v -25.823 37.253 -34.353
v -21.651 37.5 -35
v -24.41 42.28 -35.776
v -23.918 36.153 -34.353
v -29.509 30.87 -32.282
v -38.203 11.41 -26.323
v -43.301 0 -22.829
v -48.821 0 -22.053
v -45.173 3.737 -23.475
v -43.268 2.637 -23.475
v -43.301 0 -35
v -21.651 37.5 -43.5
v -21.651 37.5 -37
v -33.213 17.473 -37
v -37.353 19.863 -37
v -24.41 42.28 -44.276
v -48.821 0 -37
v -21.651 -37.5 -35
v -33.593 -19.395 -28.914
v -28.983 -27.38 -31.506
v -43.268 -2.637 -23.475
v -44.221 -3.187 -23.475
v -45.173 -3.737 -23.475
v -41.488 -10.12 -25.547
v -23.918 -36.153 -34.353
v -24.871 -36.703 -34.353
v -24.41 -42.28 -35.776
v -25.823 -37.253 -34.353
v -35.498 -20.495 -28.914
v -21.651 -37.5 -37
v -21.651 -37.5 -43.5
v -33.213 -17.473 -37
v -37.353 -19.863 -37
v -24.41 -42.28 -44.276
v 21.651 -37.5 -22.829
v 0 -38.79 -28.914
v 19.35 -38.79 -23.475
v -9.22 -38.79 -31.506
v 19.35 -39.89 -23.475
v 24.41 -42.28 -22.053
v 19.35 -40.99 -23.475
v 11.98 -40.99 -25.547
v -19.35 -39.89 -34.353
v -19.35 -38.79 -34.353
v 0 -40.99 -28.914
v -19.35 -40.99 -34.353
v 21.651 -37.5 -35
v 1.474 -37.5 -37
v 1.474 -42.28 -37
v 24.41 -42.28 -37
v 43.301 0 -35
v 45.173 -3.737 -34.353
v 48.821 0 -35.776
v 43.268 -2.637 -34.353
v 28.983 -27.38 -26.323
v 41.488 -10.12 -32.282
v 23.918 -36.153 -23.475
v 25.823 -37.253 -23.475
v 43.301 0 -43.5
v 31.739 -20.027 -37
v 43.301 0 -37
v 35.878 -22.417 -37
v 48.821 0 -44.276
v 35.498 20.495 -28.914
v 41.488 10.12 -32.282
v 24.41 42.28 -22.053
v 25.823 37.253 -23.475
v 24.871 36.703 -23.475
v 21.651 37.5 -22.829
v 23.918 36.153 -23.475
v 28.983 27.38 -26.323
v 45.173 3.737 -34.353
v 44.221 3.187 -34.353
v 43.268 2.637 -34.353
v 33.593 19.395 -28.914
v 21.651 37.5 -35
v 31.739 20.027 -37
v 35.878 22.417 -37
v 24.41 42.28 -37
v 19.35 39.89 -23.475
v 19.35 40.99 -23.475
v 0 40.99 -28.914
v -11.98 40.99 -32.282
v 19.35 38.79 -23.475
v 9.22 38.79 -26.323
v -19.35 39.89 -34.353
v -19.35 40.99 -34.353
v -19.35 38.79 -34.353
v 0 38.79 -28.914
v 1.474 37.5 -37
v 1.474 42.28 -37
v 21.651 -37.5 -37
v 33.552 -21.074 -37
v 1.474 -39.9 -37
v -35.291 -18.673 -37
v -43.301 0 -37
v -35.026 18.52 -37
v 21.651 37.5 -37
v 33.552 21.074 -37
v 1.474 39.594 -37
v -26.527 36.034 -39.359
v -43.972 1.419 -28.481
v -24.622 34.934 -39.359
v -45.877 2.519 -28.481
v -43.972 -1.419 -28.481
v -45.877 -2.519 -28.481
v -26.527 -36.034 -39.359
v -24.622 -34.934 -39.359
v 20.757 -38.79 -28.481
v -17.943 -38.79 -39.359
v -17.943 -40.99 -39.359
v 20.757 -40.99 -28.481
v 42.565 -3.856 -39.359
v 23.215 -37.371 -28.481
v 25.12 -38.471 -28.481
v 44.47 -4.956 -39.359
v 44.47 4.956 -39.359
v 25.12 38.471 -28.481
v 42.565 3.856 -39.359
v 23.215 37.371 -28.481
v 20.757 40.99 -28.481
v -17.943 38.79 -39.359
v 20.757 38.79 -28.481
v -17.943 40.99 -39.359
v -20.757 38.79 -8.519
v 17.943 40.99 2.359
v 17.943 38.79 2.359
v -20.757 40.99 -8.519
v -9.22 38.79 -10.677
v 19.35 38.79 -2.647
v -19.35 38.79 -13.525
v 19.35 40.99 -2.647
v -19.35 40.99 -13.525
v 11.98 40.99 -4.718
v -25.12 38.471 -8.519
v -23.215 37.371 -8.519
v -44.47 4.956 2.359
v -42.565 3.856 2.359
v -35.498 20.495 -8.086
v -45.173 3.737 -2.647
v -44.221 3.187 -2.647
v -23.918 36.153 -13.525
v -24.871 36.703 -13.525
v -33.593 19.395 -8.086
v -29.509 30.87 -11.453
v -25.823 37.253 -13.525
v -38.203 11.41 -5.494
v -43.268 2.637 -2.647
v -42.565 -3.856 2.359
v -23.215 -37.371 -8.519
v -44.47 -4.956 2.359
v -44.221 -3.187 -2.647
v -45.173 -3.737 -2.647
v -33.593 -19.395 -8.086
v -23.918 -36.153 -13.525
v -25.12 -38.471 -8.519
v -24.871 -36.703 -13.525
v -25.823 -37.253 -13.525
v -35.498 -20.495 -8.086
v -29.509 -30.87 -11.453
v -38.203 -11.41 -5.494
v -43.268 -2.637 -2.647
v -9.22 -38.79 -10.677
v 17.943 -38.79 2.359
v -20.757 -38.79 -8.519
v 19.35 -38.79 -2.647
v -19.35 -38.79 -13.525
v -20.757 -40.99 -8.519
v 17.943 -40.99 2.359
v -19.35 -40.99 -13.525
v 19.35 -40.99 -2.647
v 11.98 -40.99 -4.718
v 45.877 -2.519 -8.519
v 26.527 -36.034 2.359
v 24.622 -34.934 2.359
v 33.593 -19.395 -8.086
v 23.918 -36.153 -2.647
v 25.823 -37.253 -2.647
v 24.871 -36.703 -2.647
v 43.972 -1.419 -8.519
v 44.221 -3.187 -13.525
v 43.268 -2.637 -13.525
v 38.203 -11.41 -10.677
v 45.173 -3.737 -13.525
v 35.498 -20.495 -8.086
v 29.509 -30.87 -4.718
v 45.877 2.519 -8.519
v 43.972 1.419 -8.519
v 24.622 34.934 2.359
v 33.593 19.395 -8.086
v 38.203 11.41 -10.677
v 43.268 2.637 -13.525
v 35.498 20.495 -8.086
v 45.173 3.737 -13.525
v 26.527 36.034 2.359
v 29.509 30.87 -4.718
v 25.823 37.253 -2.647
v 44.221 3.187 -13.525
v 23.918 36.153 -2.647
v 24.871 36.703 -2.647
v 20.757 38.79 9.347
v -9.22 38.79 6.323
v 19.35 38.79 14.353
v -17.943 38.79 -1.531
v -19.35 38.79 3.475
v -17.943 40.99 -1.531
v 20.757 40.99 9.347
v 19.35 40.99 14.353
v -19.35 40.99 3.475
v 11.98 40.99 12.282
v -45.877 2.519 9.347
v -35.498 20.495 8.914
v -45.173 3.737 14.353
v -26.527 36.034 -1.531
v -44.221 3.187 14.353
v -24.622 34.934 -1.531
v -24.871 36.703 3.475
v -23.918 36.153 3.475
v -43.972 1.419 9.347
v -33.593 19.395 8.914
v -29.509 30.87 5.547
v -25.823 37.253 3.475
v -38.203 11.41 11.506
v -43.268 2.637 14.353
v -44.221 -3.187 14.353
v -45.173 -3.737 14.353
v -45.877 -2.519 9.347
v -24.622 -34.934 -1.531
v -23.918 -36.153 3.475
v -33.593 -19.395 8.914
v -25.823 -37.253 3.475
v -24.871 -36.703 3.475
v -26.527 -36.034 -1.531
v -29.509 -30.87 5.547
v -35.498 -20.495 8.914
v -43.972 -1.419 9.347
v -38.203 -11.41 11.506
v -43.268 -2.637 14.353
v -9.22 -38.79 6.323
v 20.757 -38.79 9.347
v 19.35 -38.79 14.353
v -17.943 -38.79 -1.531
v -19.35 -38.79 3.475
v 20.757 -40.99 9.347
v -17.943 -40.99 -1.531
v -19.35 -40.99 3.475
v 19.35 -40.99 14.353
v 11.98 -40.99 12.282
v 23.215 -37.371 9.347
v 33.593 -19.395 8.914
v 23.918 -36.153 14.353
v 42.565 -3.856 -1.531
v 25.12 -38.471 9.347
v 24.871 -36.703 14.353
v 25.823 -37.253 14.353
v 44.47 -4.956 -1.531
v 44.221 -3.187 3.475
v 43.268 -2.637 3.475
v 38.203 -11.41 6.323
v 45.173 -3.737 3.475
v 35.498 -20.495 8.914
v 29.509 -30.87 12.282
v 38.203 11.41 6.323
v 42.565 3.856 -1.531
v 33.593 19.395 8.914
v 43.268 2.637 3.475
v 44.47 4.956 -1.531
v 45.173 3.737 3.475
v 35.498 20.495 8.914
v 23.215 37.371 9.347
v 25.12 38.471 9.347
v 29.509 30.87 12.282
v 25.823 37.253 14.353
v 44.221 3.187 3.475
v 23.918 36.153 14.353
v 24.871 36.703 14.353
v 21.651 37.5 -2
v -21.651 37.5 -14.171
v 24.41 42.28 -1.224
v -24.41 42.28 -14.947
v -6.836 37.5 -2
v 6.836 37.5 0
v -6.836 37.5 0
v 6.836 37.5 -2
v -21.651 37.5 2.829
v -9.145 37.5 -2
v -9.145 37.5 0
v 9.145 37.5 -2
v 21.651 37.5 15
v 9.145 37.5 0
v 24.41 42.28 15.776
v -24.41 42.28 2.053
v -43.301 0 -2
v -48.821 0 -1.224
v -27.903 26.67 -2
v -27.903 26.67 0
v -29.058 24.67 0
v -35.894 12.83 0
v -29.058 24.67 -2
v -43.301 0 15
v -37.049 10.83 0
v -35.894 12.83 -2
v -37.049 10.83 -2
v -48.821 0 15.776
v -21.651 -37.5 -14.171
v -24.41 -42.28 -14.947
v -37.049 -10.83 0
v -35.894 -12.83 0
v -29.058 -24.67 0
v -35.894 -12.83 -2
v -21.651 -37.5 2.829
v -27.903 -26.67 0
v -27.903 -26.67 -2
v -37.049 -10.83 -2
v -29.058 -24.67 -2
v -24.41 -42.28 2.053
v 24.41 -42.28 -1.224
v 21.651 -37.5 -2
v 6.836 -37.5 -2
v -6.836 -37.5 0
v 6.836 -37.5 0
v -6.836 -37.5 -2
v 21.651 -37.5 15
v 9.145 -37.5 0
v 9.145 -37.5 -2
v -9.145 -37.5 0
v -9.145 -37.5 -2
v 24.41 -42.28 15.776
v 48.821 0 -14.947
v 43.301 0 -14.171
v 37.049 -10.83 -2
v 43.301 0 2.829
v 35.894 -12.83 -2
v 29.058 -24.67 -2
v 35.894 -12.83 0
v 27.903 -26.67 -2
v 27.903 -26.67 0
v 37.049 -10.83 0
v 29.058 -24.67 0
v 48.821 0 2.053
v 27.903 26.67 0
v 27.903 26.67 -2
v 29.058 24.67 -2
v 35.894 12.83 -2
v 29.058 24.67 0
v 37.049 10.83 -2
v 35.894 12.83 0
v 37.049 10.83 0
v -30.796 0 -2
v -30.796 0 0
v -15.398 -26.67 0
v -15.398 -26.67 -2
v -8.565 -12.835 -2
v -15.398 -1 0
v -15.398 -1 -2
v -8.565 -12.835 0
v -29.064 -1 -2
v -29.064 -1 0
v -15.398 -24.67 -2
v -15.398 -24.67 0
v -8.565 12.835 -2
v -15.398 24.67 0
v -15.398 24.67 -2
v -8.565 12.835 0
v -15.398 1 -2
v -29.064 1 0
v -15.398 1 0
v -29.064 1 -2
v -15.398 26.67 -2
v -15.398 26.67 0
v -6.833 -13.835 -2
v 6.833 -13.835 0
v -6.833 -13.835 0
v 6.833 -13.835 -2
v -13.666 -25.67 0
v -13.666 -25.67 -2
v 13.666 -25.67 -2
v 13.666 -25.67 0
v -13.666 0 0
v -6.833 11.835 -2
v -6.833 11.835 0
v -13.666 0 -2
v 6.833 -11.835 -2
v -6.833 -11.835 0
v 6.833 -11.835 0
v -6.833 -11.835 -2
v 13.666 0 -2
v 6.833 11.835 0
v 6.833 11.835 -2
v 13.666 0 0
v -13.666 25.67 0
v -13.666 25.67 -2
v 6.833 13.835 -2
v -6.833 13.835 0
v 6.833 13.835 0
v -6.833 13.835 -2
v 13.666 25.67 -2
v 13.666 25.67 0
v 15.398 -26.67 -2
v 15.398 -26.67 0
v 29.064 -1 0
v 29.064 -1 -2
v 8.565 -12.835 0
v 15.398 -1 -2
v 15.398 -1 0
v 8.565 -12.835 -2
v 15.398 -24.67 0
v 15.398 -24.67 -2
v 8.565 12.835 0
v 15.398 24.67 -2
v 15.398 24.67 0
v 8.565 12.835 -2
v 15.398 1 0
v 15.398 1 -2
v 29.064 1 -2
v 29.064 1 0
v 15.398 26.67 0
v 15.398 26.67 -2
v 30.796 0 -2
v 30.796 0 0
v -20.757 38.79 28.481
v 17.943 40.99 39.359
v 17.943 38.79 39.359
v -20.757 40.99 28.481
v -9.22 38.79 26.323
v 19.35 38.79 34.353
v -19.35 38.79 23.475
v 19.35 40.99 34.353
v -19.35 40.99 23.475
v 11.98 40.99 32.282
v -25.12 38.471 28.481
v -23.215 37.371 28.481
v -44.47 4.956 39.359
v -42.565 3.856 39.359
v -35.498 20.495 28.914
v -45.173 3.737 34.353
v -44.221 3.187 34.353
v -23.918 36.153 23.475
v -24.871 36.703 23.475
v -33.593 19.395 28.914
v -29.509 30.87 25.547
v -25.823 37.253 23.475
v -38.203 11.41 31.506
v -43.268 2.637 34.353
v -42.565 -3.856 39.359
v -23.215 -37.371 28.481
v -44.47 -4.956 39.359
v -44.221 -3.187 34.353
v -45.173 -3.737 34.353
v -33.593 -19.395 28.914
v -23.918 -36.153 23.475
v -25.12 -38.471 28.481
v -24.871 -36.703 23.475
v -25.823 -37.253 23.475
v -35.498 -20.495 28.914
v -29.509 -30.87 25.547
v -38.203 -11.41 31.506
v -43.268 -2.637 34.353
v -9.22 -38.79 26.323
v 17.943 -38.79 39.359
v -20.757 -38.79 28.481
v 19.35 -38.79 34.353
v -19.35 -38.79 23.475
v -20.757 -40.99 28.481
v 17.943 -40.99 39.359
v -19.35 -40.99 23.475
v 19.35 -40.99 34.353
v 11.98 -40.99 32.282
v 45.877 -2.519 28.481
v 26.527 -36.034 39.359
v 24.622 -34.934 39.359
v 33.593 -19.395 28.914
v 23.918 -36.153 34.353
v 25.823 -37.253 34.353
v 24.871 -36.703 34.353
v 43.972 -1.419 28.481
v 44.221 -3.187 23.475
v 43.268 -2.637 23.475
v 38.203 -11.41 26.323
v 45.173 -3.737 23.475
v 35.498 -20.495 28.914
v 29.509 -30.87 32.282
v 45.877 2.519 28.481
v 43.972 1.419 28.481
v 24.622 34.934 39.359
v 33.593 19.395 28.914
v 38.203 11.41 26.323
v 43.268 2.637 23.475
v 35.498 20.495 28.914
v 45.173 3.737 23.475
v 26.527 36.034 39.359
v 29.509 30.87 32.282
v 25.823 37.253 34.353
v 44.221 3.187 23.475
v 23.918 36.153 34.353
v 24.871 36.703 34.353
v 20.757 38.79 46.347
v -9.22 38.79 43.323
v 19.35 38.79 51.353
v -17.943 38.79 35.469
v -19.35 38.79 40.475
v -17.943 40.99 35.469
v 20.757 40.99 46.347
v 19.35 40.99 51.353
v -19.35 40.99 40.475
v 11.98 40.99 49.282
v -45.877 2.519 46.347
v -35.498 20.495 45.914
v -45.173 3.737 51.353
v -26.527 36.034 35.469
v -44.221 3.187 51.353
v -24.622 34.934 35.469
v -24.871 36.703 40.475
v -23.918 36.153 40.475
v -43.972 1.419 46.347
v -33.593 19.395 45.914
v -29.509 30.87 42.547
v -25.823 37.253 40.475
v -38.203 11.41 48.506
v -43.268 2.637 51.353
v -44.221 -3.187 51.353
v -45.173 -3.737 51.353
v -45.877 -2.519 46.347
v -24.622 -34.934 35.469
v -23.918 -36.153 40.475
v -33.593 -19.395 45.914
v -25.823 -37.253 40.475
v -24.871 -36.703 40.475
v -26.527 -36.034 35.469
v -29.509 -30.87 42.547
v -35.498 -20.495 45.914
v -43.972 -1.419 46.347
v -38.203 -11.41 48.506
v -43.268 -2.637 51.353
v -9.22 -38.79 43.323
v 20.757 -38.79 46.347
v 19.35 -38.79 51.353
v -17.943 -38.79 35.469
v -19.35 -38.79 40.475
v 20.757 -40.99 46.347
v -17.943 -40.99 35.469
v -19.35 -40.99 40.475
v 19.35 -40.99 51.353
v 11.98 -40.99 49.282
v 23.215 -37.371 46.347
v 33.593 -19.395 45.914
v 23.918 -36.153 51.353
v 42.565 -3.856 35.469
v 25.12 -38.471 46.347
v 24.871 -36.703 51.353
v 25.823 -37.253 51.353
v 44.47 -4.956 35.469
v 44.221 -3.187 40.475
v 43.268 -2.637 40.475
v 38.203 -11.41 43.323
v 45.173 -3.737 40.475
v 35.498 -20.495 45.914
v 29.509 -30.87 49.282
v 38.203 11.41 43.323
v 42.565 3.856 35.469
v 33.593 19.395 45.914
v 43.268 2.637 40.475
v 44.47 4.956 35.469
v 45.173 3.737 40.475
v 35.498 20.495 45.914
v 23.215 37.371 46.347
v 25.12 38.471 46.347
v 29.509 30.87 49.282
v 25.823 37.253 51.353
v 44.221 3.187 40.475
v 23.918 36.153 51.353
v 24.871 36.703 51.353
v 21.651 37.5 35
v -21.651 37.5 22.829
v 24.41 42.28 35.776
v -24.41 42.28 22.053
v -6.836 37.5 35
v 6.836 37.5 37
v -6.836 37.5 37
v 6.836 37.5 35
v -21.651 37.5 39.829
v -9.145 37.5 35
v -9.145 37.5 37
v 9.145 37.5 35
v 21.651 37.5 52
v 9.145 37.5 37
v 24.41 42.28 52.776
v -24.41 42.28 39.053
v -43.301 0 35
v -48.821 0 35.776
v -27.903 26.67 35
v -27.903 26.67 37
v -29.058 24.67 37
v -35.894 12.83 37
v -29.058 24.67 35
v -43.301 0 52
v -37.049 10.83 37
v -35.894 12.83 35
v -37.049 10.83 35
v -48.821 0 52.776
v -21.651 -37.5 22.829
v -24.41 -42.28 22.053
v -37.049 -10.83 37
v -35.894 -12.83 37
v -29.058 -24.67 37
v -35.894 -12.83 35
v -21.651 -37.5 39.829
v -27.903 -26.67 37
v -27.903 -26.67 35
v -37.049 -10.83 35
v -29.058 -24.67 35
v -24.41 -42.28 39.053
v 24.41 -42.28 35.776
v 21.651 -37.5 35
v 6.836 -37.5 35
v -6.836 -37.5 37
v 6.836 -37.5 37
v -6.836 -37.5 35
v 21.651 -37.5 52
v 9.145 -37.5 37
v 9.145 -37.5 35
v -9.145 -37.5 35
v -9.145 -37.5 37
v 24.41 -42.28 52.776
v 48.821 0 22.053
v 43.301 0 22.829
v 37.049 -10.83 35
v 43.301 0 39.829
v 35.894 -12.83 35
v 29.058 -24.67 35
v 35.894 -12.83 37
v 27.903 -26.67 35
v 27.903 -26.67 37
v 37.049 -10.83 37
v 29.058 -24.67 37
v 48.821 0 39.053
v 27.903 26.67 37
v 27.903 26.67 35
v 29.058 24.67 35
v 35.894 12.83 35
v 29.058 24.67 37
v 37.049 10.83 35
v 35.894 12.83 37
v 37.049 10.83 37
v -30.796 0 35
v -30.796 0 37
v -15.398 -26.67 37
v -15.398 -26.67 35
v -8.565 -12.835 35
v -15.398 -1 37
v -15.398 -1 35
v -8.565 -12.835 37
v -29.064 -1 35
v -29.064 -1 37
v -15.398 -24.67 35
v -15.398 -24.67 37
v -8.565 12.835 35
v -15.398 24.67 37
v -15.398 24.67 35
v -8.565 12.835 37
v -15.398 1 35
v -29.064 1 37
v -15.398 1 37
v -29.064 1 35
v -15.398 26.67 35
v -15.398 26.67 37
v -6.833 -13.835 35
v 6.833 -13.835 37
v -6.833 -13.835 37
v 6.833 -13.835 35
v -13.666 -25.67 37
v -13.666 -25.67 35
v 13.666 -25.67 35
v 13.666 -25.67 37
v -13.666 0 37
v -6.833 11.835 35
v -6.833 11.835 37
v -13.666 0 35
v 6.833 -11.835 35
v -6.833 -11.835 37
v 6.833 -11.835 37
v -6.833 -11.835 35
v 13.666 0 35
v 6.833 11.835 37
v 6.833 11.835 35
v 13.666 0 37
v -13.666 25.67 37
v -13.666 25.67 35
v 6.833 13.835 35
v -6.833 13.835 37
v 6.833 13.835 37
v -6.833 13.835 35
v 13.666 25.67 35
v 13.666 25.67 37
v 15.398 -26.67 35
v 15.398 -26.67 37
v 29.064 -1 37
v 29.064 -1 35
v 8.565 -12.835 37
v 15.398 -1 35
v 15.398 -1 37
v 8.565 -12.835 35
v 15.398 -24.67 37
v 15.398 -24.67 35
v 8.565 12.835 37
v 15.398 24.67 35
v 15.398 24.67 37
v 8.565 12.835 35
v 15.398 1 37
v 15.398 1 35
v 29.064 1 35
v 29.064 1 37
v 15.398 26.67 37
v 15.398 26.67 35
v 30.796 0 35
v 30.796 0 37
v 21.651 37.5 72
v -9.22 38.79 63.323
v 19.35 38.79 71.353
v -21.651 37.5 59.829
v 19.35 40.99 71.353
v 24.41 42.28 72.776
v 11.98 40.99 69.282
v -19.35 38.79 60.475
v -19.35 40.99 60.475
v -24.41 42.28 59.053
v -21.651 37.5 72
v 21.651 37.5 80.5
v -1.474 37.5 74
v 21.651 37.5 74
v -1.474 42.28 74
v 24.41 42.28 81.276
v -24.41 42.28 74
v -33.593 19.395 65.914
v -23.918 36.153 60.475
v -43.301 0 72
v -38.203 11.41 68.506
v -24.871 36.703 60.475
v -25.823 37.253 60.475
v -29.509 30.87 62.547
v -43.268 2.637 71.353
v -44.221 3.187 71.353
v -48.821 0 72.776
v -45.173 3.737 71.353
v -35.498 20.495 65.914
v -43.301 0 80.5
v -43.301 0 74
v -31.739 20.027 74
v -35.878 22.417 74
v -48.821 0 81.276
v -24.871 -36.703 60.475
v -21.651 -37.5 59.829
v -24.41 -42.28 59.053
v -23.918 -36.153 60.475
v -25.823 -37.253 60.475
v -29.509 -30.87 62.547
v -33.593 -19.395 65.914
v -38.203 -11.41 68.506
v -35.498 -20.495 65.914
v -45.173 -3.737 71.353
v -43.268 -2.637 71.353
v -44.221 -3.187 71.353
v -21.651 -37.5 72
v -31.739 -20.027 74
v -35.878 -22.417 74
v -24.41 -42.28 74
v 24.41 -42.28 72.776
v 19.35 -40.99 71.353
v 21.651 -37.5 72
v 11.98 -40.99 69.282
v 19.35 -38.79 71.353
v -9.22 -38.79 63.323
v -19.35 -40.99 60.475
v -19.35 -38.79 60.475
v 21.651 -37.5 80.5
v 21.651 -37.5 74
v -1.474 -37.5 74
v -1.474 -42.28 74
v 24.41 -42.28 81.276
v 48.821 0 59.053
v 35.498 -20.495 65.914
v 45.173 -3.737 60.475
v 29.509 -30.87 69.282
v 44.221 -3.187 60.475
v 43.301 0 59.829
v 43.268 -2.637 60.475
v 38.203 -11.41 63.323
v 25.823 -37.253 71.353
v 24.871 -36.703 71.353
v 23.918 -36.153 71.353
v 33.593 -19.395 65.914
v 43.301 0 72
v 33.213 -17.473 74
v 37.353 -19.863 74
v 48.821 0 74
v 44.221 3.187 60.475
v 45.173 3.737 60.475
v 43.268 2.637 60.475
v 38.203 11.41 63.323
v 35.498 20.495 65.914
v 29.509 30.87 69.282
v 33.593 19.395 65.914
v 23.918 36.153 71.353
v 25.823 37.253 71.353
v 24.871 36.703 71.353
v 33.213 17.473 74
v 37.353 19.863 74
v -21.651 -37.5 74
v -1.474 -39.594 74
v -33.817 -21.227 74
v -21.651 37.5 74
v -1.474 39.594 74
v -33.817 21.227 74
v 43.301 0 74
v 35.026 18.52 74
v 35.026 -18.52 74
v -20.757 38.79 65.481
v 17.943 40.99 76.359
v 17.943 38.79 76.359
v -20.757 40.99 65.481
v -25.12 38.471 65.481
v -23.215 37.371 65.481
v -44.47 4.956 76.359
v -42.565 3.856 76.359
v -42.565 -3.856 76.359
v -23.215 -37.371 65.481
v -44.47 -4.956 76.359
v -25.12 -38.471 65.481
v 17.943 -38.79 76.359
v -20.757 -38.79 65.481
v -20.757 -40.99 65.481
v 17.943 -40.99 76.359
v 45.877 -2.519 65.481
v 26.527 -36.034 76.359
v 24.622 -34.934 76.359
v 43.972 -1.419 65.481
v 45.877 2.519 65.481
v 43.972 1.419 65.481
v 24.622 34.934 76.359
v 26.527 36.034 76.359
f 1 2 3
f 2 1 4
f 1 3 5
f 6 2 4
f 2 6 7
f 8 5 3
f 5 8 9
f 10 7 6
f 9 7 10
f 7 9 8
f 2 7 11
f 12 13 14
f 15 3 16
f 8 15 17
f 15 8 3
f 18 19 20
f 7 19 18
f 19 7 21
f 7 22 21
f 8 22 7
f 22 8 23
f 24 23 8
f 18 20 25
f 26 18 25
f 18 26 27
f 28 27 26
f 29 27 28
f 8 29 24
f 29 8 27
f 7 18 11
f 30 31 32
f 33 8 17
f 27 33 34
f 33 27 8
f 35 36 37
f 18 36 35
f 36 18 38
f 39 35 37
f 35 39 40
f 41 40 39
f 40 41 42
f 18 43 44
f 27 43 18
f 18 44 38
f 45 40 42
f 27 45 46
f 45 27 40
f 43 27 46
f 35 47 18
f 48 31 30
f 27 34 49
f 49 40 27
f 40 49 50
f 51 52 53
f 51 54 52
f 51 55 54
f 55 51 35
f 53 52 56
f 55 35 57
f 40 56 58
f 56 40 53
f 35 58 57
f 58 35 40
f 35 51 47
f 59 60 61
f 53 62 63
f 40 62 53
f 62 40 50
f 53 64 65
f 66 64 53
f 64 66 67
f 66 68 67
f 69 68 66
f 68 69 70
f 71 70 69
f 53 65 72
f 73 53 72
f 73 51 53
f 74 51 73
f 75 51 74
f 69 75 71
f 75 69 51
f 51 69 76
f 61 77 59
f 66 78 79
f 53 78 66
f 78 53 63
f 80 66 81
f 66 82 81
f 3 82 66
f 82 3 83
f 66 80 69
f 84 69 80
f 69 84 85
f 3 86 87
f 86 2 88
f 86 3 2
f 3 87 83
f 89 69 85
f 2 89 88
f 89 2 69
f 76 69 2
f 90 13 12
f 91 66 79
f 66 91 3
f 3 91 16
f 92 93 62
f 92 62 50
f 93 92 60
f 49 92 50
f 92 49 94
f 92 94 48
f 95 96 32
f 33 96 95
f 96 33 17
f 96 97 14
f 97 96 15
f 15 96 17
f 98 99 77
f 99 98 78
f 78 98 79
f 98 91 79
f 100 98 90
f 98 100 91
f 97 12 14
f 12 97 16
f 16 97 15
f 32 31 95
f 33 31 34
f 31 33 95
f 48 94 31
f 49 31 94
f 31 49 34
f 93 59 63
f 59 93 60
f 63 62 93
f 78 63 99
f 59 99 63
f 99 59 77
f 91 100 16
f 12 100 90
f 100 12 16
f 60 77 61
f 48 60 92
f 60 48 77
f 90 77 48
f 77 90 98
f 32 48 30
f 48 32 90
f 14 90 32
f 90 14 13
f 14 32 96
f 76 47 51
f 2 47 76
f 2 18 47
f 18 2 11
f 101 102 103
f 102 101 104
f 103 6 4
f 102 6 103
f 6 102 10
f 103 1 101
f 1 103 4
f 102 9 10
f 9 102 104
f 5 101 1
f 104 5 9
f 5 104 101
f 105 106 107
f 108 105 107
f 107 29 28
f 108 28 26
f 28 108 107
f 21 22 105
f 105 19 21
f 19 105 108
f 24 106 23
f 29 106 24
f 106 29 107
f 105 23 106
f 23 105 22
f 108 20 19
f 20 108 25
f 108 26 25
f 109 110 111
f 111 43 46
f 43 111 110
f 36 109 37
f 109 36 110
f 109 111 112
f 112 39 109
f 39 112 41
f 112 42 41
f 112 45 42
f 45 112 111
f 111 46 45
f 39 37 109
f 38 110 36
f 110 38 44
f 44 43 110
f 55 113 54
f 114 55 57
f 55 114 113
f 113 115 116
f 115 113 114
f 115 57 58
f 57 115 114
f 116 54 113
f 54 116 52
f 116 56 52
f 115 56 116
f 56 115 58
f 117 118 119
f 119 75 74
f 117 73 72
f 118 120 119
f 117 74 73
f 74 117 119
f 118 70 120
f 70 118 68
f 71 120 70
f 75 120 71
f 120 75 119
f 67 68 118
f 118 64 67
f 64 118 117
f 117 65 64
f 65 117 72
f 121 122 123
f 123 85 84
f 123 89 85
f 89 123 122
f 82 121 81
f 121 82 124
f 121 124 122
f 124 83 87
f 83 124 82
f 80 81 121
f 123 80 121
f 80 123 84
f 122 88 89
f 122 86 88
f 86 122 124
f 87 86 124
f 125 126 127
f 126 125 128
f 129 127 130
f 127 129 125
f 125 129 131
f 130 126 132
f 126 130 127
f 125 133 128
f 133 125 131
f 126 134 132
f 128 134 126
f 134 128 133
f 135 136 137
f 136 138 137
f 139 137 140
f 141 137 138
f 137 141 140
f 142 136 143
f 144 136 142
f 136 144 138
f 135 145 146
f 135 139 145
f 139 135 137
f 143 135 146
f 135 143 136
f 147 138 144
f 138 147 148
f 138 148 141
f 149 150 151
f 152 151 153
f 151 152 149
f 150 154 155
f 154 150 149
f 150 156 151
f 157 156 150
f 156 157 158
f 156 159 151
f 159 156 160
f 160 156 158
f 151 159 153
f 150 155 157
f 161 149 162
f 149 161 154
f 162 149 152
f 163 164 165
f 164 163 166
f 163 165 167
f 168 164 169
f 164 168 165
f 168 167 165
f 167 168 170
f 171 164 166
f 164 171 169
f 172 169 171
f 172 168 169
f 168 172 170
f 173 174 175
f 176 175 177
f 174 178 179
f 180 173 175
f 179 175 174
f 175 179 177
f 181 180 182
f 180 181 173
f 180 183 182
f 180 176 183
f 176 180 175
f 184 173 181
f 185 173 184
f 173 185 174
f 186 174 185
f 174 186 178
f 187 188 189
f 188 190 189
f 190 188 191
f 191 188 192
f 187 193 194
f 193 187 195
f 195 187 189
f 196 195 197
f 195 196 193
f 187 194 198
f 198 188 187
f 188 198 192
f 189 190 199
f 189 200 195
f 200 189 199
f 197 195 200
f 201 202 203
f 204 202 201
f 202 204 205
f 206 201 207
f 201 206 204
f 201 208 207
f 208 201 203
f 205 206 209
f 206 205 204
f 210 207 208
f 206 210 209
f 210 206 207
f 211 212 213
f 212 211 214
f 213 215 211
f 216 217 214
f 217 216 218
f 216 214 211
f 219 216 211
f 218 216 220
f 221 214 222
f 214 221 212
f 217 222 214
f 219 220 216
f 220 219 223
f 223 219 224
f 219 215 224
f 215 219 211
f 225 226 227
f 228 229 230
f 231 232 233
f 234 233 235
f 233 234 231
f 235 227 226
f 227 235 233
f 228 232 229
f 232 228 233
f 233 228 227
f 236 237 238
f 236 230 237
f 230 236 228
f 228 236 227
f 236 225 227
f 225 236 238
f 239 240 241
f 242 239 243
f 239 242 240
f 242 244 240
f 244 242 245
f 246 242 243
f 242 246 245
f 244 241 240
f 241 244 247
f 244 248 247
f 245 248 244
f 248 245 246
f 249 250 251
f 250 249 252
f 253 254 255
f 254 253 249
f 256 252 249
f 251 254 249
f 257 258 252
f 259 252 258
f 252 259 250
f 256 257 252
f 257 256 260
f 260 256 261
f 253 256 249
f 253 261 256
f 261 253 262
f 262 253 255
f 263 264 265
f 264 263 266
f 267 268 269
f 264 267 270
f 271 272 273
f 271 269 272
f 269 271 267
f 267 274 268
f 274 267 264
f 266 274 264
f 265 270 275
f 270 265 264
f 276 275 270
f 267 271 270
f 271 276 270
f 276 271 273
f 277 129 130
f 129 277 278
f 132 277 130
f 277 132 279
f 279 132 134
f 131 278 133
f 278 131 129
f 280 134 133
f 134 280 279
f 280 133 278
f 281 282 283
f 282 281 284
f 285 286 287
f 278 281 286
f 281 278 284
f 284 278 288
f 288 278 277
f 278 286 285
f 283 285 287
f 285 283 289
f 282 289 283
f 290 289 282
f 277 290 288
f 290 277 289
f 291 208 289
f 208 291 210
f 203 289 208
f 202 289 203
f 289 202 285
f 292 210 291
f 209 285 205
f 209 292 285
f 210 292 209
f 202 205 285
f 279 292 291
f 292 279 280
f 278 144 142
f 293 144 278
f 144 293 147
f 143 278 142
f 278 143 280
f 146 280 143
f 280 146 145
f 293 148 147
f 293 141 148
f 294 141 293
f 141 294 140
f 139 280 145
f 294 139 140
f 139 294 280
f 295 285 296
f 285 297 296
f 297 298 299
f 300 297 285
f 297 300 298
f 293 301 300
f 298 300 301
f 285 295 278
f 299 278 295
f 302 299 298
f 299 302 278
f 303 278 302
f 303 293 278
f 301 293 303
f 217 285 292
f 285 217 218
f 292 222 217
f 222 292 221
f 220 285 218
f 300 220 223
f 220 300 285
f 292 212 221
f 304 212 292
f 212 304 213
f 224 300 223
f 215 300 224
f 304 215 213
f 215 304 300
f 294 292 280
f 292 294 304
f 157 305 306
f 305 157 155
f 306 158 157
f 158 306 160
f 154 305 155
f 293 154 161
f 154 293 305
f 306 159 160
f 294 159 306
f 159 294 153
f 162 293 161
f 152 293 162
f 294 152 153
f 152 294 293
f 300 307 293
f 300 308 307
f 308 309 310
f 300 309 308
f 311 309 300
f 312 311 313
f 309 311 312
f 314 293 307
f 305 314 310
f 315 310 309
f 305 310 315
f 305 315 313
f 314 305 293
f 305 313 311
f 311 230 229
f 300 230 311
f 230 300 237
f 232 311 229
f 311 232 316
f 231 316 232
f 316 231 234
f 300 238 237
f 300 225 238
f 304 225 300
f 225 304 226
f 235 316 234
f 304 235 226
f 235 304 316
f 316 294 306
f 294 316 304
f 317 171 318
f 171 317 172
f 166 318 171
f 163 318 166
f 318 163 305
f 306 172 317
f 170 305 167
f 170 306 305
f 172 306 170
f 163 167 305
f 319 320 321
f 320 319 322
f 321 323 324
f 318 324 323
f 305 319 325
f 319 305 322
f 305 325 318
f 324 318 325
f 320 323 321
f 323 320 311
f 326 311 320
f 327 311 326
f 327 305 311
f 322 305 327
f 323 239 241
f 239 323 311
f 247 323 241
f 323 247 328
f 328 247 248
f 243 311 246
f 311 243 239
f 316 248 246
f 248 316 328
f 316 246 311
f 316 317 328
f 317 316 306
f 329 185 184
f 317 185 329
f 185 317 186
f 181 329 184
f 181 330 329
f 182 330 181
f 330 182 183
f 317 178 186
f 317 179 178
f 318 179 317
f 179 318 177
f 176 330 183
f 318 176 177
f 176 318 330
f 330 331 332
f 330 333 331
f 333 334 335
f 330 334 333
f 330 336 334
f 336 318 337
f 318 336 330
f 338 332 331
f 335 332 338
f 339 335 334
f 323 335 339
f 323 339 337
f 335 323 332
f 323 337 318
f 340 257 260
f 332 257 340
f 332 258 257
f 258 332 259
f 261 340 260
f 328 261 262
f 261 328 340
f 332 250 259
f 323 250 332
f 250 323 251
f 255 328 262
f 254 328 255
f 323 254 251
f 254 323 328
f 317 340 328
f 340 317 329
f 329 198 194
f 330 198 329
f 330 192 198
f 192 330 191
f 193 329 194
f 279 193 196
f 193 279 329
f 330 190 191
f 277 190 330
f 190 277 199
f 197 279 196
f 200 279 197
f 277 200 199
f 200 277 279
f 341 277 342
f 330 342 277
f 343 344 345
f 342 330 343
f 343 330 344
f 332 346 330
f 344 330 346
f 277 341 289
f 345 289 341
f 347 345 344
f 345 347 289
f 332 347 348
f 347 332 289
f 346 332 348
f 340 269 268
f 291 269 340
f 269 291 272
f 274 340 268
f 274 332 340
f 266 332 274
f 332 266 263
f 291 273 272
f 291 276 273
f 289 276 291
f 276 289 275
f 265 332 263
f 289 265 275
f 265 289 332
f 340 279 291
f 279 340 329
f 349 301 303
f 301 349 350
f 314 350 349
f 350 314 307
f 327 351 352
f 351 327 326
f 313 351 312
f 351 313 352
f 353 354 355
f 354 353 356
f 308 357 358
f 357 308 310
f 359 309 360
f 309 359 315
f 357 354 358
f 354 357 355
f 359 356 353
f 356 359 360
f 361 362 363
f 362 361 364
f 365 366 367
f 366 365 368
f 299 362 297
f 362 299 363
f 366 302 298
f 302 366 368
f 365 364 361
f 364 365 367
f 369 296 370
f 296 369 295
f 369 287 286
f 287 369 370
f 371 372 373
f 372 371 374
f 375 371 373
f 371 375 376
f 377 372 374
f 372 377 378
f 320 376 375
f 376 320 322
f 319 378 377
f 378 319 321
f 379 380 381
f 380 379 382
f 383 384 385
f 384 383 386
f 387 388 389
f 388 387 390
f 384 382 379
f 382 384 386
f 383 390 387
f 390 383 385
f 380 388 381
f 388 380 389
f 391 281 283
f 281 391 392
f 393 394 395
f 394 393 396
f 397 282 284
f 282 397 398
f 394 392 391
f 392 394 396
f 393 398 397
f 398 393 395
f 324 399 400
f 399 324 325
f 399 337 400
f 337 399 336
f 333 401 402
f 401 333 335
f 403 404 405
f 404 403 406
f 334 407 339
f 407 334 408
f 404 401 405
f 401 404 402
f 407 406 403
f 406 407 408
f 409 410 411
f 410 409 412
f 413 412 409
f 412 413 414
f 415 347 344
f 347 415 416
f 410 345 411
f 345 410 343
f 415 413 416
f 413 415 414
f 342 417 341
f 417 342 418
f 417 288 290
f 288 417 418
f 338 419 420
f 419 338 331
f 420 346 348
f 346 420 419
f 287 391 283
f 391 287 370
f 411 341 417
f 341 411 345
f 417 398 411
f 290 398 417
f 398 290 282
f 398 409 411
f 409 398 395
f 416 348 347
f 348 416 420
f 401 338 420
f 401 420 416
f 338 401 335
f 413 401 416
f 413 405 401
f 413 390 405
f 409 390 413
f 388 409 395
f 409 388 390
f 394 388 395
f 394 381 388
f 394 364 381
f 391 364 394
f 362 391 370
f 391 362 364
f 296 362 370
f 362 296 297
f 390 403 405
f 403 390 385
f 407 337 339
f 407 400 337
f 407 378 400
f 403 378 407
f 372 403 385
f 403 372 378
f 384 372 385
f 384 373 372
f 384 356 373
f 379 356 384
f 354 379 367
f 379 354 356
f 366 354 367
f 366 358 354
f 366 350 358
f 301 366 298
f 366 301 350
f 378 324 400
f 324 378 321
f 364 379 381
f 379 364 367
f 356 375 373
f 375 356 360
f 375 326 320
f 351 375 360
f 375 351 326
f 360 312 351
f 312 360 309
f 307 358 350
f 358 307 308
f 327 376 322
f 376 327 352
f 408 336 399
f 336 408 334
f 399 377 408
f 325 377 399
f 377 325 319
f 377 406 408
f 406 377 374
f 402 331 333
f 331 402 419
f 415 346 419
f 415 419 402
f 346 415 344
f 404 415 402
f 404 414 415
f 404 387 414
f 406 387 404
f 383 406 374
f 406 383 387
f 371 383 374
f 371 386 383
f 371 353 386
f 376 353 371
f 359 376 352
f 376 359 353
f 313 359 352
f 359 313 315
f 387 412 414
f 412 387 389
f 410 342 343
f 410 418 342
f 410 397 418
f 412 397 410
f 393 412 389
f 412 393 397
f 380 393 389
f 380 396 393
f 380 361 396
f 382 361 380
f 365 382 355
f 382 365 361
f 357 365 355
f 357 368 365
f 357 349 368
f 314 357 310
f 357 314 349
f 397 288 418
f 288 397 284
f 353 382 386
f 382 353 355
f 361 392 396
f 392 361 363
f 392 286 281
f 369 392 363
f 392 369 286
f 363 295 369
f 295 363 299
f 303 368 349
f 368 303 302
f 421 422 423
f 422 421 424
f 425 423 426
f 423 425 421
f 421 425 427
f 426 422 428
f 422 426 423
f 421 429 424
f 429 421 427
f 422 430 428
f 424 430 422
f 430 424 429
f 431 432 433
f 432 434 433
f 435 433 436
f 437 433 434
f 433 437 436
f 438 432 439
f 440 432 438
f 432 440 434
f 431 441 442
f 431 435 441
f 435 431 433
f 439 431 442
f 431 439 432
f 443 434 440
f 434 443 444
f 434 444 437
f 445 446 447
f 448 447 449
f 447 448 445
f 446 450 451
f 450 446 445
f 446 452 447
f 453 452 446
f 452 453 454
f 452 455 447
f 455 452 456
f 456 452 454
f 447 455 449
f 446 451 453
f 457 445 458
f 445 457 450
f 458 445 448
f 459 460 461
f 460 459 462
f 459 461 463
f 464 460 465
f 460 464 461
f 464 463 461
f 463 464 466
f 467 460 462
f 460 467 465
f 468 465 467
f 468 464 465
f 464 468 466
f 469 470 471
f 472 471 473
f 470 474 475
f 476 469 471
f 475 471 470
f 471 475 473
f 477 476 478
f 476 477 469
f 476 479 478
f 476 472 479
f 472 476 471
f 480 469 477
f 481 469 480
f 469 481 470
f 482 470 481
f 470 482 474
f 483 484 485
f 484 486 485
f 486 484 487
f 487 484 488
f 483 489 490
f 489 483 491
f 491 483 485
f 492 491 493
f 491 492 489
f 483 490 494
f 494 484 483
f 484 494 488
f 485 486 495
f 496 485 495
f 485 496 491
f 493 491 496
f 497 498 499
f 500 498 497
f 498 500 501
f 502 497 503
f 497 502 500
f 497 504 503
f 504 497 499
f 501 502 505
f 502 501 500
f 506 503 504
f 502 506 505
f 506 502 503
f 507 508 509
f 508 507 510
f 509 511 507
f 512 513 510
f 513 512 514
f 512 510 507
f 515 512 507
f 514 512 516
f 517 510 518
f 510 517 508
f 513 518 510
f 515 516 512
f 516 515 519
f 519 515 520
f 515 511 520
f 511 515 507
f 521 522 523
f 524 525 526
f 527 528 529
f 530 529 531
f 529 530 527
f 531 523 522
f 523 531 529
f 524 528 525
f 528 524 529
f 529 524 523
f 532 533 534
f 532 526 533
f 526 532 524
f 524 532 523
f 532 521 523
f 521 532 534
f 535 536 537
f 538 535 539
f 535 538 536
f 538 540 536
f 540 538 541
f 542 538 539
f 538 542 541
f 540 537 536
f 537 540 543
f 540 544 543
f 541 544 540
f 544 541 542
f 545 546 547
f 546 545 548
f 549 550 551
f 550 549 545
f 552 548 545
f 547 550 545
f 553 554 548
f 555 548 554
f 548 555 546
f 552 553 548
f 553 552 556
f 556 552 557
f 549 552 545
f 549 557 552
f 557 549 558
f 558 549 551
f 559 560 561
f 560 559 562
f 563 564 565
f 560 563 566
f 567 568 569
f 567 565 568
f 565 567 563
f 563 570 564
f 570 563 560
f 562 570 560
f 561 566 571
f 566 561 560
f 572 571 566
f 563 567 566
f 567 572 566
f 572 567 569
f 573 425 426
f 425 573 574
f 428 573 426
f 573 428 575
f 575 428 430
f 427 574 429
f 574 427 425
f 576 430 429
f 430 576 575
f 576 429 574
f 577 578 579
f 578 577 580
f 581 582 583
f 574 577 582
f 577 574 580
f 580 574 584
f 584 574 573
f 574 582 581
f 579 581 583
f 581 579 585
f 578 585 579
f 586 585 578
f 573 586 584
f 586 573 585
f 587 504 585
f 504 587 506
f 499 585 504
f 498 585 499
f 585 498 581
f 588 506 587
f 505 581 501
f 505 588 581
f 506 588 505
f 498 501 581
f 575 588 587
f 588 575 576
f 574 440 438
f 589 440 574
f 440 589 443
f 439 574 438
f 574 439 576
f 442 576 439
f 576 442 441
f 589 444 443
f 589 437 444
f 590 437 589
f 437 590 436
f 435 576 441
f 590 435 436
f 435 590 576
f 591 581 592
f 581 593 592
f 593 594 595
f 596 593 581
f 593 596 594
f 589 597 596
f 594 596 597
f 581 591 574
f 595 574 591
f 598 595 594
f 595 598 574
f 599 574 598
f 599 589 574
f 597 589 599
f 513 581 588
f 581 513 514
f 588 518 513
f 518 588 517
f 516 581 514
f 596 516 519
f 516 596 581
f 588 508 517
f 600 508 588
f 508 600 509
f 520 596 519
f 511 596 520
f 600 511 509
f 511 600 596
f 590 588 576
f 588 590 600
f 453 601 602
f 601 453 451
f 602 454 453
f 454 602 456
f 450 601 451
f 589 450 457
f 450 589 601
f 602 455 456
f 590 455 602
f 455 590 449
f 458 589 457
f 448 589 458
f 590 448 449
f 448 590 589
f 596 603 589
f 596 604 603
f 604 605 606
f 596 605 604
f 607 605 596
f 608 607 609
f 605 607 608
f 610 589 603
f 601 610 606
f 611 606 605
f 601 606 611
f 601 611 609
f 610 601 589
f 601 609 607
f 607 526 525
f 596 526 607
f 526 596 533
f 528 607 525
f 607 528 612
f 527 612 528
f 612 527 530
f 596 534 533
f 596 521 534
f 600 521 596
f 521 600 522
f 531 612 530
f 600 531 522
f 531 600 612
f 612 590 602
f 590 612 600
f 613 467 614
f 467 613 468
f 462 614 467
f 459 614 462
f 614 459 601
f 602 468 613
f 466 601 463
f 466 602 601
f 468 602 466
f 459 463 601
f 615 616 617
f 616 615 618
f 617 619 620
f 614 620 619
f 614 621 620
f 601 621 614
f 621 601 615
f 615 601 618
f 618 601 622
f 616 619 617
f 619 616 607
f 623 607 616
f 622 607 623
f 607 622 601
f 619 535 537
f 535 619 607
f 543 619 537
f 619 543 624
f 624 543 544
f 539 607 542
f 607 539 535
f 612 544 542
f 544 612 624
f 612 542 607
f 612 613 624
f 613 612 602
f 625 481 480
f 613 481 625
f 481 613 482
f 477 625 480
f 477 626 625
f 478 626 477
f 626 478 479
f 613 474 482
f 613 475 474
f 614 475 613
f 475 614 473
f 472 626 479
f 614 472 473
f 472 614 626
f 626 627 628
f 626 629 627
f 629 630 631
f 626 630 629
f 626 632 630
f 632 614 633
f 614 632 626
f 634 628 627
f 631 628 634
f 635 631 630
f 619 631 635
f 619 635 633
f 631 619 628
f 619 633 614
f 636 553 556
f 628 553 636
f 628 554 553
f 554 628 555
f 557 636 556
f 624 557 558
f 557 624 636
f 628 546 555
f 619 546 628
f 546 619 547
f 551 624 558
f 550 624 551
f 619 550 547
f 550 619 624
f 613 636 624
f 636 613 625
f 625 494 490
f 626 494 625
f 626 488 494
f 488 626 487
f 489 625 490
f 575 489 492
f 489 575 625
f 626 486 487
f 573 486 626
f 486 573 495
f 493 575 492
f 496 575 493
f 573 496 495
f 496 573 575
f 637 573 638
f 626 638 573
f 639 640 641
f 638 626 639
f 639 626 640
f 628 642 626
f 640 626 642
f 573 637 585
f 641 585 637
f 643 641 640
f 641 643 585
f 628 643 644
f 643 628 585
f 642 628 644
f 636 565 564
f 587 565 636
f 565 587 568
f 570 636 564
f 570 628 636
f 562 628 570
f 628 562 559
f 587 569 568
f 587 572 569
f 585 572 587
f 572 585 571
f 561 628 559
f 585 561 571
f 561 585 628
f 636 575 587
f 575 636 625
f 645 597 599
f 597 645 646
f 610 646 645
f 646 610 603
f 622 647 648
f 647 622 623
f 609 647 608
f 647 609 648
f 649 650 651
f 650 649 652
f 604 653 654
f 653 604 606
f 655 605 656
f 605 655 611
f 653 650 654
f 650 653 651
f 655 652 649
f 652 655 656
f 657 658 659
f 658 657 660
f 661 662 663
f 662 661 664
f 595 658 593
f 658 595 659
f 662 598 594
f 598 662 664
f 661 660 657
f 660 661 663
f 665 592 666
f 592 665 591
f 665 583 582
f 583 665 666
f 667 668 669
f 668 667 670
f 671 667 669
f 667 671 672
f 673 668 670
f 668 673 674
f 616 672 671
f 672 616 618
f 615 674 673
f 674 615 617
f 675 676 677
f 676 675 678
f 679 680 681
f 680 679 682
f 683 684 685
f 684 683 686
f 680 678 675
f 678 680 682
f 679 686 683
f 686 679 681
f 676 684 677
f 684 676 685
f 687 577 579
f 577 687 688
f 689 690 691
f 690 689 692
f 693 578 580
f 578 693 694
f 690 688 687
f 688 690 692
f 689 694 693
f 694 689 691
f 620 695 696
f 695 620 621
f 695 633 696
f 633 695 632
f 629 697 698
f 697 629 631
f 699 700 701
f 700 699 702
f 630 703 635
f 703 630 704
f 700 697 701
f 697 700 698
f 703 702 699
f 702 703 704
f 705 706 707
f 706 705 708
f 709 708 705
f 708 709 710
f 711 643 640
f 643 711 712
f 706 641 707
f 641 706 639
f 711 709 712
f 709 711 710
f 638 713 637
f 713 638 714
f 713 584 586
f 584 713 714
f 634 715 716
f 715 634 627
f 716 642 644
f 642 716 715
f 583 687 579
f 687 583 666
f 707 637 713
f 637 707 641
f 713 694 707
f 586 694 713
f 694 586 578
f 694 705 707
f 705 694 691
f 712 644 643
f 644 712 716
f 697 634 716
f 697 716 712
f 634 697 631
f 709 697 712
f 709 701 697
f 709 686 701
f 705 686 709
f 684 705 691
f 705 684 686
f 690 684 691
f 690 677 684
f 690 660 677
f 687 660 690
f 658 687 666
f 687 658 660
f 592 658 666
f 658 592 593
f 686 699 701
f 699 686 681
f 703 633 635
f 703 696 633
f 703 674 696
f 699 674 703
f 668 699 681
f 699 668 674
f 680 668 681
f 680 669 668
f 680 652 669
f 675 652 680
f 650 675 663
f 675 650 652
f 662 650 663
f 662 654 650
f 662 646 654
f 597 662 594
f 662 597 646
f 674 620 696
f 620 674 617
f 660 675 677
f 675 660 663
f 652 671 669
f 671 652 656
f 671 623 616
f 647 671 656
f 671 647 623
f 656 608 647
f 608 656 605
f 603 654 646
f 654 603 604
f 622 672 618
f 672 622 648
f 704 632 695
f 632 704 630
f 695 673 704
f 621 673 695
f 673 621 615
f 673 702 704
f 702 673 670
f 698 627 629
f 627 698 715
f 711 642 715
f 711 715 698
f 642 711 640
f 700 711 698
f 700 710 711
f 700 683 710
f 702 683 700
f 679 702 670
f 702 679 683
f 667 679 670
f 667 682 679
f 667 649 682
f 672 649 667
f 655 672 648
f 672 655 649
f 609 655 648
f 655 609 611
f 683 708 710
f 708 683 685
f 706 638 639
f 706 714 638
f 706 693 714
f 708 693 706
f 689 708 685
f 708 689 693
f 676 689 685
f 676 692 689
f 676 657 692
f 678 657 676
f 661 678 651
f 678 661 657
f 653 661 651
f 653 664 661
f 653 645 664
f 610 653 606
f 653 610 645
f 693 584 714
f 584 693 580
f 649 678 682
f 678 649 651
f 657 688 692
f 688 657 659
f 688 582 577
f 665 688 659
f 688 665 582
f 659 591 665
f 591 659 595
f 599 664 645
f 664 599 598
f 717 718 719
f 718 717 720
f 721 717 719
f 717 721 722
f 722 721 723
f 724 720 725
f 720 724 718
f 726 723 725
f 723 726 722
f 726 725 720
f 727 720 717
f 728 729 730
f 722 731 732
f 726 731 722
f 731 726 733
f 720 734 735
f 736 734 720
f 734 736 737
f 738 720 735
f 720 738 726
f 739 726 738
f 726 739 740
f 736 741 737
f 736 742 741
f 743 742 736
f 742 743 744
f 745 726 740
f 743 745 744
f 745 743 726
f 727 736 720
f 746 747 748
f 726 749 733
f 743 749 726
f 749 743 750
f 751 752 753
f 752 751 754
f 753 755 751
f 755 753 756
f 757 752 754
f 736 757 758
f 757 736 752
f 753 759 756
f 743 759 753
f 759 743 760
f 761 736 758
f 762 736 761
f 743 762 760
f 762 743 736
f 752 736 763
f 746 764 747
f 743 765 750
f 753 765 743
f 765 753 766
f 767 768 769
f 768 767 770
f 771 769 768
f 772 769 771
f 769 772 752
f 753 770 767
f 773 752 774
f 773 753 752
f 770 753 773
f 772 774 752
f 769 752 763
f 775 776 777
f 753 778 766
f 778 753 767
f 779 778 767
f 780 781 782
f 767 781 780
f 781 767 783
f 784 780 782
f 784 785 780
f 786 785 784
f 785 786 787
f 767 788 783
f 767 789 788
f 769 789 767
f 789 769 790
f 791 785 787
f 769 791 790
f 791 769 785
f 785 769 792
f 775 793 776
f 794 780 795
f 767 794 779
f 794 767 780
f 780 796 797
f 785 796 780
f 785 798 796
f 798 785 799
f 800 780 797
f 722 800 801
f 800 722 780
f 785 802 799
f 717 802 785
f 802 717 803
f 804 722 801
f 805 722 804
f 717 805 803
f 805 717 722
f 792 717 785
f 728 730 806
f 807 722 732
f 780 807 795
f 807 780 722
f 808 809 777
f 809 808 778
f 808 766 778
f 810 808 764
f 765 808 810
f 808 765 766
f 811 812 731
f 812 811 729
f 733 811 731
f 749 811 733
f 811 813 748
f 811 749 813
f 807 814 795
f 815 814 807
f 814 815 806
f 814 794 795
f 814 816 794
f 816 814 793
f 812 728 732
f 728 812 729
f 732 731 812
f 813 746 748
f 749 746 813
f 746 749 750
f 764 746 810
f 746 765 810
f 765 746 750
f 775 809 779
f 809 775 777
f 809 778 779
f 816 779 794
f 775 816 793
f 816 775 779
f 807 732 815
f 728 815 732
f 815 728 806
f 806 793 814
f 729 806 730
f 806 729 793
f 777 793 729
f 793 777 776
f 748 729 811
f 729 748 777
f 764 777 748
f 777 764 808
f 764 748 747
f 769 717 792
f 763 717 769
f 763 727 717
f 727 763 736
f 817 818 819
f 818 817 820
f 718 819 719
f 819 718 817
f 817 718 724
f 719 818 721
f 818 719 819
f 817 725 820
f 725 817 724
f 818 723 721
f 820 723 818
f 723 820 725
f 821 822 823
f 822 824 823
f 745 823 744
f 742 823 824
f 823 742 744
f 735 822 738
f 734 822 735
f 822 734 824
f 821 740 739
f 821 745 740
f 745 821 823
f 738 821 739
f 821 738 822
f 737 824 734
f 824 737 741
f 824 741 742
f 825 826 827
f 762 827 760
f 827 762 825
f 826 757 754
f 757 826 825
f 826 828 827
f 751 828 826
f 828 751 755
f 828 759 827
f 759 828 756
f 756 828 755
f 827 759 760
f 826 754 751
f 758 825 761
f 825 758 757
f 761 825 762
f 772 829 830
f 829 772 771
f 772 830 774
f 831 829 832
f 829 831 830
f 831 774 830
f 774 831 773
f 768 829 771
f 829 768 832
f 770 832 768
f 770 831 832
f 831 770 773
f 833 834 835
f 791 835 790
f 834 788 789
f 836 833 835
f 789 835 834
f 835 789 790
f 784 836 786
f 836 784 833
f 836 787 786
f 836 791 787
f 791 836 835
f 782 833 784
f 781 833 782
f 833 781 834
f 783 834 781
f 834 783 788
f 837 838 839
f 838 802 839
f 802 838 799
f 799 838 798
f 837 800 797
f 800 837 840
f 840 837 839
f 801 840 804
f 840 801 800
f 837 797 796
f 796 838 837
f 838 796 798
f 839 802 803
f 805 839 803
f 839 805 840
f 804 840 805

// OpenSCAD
$fs = $preview ? 10 : 1;

/* [parameters] */
selected_module = "all"; // ["all", "chamber", "lid", "support blocker"]


/* [Design Options] */

// number of sides
Sides = 6; // [3:8]
sides = Sides;

// thin wall thickness
Thin_Wall_Thickness=1.29;
twt=Thin_Wall_Thickness;

// thickness of the hexagon floor
Floor_Thickness = 2;
floor_thickness = Floor_Thickness;

/* [Soap Dimensions] */
// Height of soap. Include wiggle room!
Soap_Height = 15;
h_soap = Soap_Height;
// Diameter of soap. Include wiggle room!
Soap_Diameter = 75;
d_soap = Soap_Diameter;

/* [Magnet Dimensions] */
Magnet_Thickness = 2;
h_magnet = Magnet_Thickness + .2;
Magnet_Width = 5;
w_magnet = Magnet_Width + .2;
Magnet_Length = 40;
l_magnet = Magnet_Length + .2;



wall_thickness = 2*twt+h_magnet;

wobble = 8;
hole_spacing = (d_soap + floor_thickness+.01) / 3;
hole_percent = 75;
module __Customizer_Limit__ () {}

//distance from center
r_0 = d_soap / 2 * (1 / cos(180 / sides)) * (1 / cos(wobble));
r_1 = (d_soap / 2 + wall_thickness) * (1 / cos(180 / sides)) * (1 / cos(wobble));
h_0 = 0+0;
h_1 = h_soap + floor_thickness;


//r, theta, phi
function sph2cart(rtp) = [rtp.x * sin(rtp.y) * cos(rtp.z), rtp.x * sin(rtp.y) * sin(rtp.z), rtp.x * cos(rtp.y)];

module magnets() {
    //magnets need to be rotated about a derived angle
    //right triangle from top of sloped surface to midpoint of sloped surface to xy intersection
    radius = 1; //to corner
    horizontal_apothem = radius * cos(180 / sides); //to face
    side = radius * sin(180 / sides) * 2;
    dh = radius * tan(wobble);
    tilt = atan2(dh, side / 2);
    for (i = [1:sides]) {
        theta = (i + .5) * 360 / sides;
        direction = 2 * (i % 2) - 1;
        rotate([tilt * - direction, 0, theta])
            translate([(d_soap + wall_thickness) / 2, 0, 0])
                cube([h_magnet, l_magnet, w_magnet * 2], center = true);
    }
    //todo magnets stick out a little
}

module walls(h_1=h_1) {
    proto_points = [[r_0, h_0], [r_0, h_1], [r_1, h_1], [r_1, h_0]];
    function sector(idx, wobble) = [for (pp = proto_points) (sph2cart([pp[0], wobble, idx * 360 / sides]) + [0, 0, pp[1]
        ])];

    //points = [for (i=[1:sides]) each sector(i, 90-wobble*(2*(i%2)-1))];
    sectors = [for (i = [1:sides]) sector(i, 90 - wobble * (2 * (i % 2) - 1))];
    points = [for (i = [0:len(sectors) - 1], j = [0:len(sectors[0]) - 1]) sectors[i][j]];
    //TESTING// for(point=points)translate(point) cube(center=true);

    proto_faces = [[0, 4, 7, 3], [1, 5, 4, 0], [2, 6, 5, 1], [3, 7, 6, 2]];
    //faces = [for(i=[0:sides-1]) each [for (pf=proto_faces) [for(j=pf) (j+i*4)%len(points)]]];
    face_groups = [for (i = [0:sides - 1]) [for (pf = proto_faces) [for (j = pf) (j + i * 4) % len(points)]]];
    faces = [for (i = [0:len(face_groups) - 1], j = [0:len(face_groups[0]) - 1]) face_groups[i][j]];
    polyhedron(points = points, faces = faces, convexity = 20);
}

module support_blocker(){
    proto_points = [[r_0-1, h_0], [r_0-1, h_1], [r_1+4, h_1], [r_1+4, h_0]];
    function sector(idx, wobble) = [for (pp = proto_points) (sph2cart([pp[0], wobble, idx * 360 / sides]) + [0, 0, pp[1]
        ])];

    //points = [for (i=[1:sides]) each sector(i, 90-wobble*(2*(i%2)-1))];
    sectors = [for (i = [1:sides]) sector(i, 90 - wobble * (2 * (i % 2) - 1))];
    points = [for (i = [0:len(sectors) - 1], j = [0:len(sectors[0]) - 1]) sectors[i][j]];
    //TESTING// for(point=points)translate(point) cube(center=true);

    proto_faces = [[0, 4, 7, 3], [1, 5, 4, 0], [2, 6, 5, 1], [3, 7, 6, 2]];
    //faces = [for(i=[0:sides-1]) each [for (pf=proto_faces) [for(j=pf) (j+i*4)%len(points)]]];
    face_groups = [for (i = [0:sides - 1]) [for (pf = proto_faces) [for (j = pf) (j + i * 4) % len(points)]]];
    faces = [for (i = [0:len(face_groups) - 1], j = [0:len(face_groups[0]) - 1]) face_groups[i][j]];
		
    polyhedron(points = points, faces = faces, convexity = 20);
}


module chamber() {
    translate([0, 0, - r_0 * sin(wobble) - floor_thickness]) difference() {
        walls();
        #magnets();
        translate([0, 0, h_1]) #magnets();
    }

    //floor
    translate([0, 0, - floor_thickness]) difference() {
        cylinder(d = d_soap * (1 / cos(180 / sides)), h = floor_thickness, $fn = sides);
        for (i = [- 5:5], j = [- 5:5])
        rotate([0, 0, 30])
            translate([hole_spacing * i, 0, 0])
                rotate([0, 0, 60])
                    translate([j * hole_spacing, 0, - .01])
                        rotate([0, 0, 30])
                            cylinder(d = (hole_spacing - floor_thickness) / cos(30), h = floor_thickness + .02, $fn = 6);
    }
}


module lid() {
    difference() {
        union(){
            //cut off tips
            difference(){
                translate([0, 0, - r_0 * sin(wobble) - floor_thickness]) walls();
                cylinder(r = r_1 * 11, h = h_1 * 11, $fn = 4);
            }
            //not cut off shorter tips
            translate([0, 0, - r_0 * sin(wobble) - floor_thickness]) walls(h_1=h_1/2);
            //ceiling
            translate([0, 0, - floor_thickness])
                cylinder(d = d_soap * (1 / cos(180 / sides)), h = floor_thickness, $fn = sides);
        }
        translate([0, 0, - r_0 * sin(wobble) - floor_thickness]) #magnets();
    }
}


if(selected_module == "all"){
    spacing = h_1 + 20;
    translate([0, 0, spacing*-1])
        mirror([0,0,1])
        rotate([0,0,360/sides])
        lid();
    translate([0, 0, spacing*0]) chamber();
    translate([0, 0, spacing*1]) chamber();
    translate([0, 0, spacing*2]) lid();

} else if (selected_module == "chamber"){
    chamber();
} else if (selected_module == "lid"){
    translate([0, 0, h_1 + 10]) lid();
} else if (selected_module == "support blocker"){
    support_blocker();
}
